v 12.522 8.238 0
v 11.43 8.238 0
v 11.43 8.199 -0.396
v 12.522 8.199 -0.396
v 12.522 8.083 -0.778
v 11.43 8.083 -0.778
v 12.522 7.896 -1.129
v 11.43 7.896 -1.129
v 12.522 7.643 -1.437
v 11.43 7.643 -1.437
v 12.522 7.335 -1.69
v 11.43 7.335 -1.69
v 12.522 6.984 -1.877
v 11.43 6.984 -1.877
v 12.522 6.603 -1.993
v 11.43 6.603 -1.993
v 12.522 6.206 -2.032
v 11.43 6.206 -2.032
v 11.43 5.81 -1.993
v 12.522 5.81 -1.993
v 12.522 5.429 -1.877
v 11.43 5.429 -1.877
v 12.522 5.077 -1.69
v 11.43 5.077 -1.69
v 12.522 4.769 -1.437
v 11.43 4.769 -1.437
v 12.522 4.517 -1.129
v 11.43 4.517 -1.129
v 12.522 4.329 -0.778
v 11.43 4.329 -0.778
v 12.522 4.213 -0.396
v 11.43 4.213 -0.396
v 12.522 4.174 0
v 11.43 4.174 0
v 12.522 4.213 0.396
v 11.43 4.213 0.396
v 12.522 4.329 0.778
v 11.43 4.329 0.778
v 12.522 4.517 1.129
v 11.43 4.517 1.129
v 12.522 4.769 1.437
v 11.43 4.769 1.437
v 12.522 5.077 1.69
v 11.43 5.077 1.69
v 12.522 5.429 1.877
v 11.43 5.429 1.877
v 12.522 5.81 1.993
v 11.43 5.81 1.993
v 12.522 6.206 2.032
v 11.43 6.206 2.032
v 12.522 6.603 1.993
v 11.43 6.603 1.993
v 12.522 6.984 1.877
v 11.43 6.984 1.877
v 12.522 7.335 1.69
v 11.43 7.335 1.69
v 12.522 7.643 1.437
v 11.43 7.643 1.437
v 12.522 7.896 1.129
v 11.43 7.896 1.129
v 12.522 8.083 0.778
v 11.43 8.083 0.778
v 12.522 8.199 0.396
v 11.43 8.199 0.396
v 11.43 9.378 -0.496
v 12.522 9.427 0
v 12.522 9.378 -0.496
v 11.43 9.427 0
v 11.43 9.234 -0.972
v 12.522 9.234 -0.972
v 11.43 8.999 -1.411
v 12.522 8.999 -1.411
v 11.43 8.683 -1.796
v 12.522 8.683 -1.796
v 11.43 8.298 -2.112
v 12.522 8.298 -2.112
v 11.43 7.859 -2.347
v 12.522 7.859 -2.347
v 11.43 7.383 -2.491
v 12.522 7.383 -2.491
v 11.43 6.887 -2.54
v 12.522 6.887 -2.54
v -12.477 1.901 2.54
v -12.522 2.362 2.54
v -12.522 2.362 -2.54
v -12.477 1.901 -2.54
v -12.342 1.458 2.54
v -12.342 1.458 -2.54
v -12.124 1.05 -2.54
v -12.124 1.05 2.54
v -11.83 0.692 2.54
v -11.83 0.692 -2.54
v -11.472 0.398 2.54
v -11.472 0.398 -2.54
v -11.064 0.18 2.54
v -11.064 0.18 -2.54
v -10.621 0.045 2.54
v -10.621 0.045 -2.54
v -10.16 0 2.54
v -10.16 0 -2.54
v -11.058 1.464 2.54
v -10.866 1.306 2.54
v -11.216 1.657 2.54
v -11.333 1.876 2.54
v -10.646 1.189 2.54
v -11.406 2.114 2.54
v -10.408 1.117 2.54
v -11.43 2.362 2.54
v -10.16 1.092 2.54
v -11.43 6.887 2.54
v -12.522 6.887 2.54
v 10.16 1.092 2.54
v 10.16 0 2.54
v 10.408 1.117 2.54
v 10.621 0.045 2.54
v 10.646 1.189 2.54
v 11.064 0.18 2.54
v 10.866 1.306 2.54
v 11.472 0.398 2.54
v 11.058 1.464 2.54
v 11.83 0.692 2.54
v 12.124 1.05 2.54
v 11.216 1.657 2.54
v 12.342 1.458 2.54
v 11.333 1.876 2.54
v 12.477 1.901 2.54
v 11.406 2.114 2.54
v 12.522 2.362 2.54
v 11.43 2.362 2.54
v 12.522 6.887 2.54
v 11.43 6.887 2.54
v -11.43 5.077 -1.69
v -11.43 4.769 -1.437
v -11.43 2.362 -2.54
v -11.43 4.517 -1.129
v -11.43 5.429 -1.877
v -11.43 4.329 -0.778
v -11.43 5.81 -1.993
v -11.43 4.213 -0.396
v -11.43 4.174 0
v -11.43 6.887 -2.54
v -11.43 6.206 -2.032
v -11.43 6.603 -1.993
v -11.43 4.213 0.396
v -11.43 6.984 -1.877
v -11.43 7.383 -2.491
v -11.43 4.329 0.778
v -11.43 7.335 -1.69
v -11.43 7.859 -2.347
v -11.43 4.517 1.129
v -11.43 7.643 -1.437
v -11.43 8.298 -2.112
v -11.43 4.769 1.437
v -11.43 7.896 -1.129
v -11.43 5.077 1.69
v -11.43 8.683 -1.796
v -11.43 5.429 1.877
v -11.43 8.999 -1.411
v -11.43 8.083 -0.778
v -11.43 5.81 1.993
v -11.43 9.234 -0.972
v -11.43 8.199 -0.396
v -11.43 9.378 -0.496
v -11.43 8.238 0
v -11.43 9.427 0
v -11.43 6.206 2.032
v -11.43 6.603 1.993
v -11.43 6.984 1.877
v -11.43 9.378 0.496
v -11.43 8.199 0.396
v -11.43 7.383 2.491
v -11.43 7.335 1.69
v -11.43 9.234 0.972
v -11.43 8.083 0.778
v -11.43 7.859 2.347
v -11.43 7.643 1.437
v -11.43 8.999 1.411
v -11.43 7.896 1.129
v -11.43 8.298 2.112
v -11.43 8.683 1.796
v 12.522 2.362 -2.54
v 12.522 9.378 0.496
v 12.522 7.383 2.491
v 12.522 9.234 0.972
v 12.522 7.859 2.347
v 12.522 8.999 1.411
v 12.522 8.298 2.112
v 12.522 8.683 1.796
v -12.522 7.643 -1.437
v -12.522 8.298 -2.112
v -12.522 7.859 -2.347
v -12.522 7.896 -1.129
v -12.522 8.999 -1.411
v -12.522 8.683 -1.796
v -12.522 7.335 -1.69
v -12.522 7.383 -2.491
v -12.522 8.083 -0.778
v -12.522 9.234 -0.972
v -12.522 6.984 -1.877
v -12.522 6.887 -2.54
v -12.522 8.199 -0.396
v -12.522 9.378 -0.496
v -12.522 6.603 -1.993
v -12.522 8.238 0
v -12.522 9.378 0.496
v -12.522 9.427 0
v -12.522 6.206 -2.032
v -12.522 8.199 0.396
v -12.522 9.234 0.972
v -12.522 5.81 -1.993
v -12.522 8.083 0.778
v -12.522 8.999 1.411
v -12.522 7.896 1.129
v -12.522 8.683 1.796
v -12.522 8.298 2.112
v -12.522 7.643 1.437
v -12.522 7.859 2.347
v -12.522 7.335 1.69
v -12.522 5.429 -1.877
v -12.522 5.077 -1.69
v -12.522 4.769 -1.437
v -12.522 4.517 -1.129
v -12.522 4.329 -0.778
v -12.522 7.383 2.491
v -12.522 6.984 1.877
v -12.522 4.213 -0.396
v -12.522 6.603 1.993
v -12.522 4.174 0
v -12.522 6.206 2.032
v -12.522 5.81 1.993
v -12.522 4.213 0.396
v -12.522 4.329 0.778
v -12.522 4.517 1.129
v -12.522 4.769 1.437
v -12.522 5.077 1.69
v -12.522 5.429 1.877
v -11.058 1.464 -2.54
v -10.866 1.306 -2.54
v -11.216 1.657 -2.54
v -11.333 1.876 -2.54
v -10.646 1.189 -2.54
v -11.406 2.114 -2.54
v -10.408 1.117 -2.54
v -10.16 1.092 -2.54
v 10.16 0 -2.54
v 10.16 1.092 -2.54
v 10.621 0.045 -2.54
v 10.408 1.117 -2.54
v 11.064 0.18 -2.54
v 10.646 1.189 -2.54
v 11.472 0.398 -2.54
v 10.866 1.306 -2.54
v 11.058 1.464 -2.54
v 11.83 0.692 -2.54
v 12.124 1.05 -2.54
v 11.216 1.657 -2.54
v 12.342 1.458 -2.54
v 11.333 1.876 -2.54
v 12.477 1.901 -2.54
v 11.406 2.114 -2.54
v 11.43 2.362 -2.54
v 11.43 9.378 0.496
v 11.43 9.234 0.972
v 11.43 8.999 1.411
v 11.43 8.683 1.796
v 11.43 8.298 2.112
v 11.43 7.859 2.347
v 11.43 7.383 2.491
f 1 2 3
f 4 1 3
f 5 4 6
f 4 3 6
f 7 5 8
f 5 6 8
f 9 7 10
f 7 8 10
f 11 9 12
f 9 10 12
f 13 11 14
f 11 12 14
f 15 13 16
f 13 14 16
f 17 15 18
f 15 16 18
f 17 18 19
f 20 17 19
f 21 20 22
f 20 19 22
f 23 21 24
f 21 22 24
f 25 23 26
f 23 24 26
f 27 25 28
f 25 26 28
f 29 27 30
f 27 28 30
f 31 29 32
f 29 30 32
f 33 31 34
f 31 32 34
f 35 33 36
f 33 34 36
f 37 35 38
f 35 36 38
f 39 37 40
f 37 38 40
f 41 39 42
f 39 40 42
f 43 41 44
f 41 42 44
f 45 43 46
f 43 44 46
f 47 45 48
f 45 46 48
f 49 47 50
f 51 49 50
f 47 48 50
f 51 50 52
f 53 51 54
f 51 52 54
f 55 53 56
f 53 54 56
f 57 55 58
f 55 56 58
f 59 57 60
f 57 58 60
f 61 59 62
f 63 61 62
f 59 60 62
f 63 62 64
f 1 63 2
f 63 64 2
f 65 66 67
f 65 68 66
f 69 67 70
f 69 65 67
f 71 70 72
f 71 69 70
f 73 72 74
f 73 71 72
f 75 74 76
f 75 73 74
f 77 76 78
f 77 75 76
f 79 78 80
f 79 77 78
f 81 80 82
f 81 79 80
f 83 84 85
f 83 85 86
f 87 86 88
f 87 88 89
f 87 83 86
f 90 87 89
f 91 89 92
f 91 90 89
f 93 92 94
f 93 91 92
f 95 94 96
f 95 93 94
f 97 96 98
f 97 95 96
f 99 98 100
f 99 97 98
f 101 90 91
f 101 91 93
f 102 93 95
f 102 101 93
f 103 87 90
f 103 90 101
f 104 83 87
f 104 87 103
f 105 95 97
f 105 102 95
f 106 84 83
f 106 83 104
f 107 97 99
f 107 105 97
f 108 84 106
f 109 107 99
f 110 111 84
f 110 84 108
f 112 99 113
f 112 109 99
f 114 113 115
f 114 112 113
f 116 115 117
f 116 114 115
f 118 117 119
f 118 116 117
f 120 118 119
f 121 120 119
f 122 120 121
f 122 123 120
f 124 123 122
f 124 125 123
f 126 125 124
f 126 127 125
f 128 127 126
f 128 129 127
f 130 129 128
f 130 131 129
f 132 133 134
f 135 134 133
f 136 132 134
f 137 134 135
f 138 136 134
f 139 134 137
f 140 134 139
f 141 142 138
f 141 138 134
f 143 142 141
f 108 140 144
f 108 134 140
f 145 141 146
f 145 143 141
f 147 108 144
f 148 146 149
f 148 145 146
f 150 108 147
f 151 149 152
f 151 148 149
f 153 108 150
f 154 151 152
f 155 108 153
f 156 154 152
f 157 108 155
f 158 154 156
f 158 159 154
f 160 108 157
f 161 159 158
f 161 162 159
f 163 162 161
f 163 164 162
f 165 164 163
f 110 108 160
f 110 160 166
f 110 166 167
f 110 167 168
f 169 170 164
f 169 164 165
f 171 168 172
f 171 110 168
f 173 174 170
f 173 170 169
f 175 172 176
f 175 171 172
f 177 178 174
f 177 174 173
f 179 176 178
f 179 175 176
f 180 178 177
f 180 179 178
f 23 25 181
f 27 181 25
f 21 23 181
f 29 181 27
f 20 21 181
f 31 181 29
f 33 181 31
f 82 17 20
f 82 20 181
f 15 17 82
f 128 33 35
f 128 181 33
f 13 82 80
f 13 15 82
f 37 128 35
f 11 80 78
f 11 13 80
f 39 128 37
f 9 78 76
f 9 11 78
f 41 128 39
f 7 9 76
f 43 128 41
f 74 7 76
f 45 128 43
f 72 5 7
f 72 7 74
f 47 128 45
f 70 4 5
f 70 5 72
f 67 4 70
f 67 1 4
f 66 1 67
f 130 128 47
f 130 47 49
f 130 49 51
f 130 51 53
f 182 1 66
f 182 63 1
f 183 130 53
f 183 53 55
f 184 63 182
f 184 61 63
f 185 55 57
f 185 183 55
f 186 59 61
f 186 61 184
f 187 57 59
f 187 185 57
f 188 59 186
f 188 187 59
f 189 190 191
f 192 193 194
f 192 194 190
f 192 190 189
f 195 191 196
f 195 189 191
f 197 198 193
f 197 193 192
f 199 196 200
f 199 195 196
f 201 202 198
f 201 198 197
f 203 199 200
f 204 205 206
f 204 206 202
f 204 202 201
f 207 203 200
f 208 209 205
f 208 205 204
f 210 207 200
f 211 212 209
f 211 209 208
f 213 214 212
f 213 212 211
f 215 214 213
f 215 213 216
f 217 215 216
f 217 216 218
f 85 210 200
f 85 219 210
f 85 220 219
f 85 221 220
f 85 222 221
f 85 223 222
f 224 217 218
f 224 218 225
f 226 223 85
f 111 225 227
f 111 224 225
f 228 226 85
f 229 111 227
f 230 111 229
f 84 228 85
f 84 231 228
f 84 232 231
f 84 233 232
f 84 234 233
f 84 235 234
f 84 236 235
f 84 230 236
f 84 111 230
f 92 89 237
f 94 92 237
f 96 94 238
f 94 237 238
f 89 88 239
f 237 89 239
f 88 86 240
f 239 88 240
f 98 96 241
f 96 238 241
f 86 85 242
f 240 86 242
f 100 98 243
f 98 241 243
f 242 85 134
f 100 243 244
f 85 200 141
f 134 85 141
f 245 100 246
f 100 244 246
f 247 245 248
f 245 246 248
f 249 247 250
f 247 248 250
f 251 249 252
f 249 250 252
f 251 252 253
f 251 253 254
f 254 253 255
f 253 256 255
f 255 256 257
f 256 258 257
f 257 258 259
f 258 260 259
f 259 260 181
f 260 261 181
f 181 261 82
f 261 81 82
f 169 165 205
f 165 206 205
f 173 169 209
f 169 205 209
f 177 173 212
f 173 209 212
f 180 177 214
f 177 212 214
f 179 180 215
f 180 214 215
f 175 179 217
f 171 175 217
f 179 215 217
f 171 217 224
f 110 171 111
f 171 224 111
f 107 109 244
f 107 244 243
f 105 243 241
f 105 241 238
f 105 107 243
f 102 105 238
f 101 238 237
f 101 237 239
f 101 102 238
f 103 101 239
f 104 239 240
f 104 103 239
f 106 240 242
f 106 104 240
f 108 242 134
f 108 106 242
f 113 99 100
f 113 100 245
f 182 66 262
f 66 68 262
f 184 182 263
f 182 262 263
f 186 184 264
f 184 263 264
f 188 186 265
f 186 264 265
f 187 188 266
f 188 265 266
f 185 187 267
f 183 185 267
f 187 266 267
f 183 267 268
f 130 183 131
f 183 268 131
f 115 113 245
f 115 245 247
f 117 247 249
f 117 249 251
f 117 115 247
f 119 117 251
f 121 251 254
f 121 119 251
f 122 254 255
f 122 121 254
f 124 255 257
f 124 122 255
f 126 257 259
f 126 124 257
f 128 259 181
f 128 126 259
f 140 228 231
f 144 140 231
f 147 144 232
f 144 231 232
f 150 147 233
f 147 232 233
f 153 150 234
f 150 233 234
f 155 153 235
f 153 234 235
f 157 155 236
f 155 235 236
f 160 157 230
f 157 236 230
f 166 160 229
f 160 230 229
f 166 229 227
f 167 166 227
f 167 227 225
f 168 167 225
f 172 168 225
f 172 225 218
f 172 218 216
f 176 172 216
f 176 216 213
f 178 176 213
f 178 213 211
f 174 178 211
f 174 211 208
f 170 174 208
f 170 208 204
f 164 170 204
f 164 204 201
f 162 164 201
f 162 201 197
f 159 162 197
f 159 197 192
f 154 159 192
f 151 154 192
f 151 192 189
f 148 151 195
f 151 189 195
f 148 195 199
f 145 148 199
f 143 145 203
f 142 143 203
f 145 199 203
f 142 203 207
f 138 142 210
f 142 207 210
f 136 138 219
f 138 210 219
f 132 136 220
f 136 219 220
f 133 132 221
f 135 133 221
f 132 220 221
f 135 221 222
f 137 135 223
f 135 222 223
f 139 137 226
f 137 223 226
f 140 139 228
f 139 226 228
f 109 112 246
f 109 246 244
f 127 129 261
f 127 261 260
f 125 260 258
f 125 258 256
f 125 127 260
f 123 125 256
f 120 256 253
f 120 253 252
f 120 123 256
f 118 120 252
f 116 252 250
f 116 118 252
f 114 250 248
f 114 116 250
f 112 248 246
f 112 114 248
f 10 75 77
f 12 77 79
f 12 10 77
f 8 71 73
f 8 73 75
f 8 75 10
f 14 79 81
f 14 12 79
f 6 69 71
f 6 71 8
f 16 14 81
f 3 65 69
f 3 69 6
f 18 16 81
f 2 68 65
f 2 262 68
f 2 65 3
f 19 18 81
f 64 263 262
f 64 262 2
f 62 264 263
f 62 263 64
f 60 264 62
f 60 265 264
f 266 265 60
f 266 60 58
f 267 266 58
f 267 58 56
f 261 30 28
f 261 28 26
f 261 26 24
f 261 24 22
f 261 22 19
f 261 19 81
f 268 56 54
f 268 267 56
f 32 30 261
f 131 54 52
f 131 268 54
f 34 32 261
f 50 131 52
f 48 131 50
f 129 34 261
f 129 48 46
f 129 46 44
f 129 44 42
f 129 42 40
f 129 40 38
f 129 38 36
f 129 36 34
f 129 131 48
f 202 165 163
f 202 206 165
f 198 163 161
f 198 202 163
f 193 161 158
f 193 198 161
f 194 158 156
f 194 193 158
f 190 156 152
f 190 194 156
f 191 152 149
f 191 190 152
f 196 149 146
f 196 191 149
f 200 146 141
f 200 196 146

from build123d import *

# Parameters (mm, degrees)
F1_DEPTH = 2.54
F2_R     = 2.53999
F4_D     = 4.064
F4_DEPTH = 12.5231992362
F5_D     = 4.064


# Not quite as in the source:
# - a fillet or chamfer is up to 0.001 mm smaller than in the source, because OpenCascade refuses the exact size


with BuildPart() as f1:
    # F0 (on Top) → F1 (new body, symmetric)
    with BuildSketch(Plane.XY):
        with BuildLine():
            Line((-12.5221992362, 9.4272772469), (-12.5221992362, 8.3157558613))
            Line((-12.5221992362, 8.3157558613), (-12.5221992362, 2.3621992362))
            ThreePointArc((-12.5221992362, 2.3621992362), (-11.8303270984, 0.6918721378), (-10.16, 0))
            Line((-10.16, 0), (0, 0))
            Line((0, 0), (10.16, 0))
            ThreePointArc((10.16, 0), (11.8303270984, 0.6918721378), (12.5221992362, 2.3621992362))
            Line((12.5221992362, 2.3621992362), (12.5221992362, 8.3157558613))
            Line((12.5221992362, 8.3157558613), (12.5221992362, 9.4272772469))
            Line((12.5221992362, 9.4272772469), (11.43, 9.4272772469))
            Line((11.43, 9.4272772469), (11.43, 8.3157558613))
            Line((11.43, 8.3157558613), (11.43, 2.3621992362))
            ThreePointArc((11.43, 2.3621992362), (11.0580256121, 1.464173624), (10.16, 1.0921992362))
            Line((10.16, 1.0921992362), (1.2192031136, 1.0921992362))
            Line((1.2192031136, 1.0921992362), (0, 1.0921992362))
            Line((0, 1.0921992362), (-10.16, 1.0921992362))
            ThreePointArc((-10.16, 1.0921992362), (-11.0580256121, 1.464173624), (-11.43, 2.3621992362))
            Line((-11.43, 2.3621992362), (-11.43, 8.3157558613))
            Line((-11.43, 8.3157558613), (-11.43, 9.4272772469))
            Line((-11.43, 9.4272772469), (-12.5221992362, 9.4272772469))
        make_face()
    extrude(amount=F1_DEPTH, both=True)

    # F2 (radius 2.54 in the source; OpenCascade refuses exactly that, so slightly less here)
    f2_edges = [f1.edges().sort_by_distance(p)[0] for p in [
        (-11.9761, 9.427277, 2.54),
        (-11.9761, 9.427277, -2.54),
        (11.9761, 9.427277, 2.54),
        (11.9761, 9.427277, -2.54),
    ]]
    fillet(f2_edges, radius=F2_R)

    # F4 (through all, one way)
    with BuildSketch(Plane(origin=(0, 0, 0), x_dir=(0, 1, 0), z_dir=(-1, 0, 0))):
        with Locations((6.2061757781, 0)):
            Circle(F4_D / 2)
    extrude(amount=-F4_DEPTH, mode=Mode.SUBTRACT)

    # F5 (through all)
    with Locations(Plane.YZ):
        with Locations((6.2061757781, 0)):
            Hole(F5_D / 2)


solid = f1.part
